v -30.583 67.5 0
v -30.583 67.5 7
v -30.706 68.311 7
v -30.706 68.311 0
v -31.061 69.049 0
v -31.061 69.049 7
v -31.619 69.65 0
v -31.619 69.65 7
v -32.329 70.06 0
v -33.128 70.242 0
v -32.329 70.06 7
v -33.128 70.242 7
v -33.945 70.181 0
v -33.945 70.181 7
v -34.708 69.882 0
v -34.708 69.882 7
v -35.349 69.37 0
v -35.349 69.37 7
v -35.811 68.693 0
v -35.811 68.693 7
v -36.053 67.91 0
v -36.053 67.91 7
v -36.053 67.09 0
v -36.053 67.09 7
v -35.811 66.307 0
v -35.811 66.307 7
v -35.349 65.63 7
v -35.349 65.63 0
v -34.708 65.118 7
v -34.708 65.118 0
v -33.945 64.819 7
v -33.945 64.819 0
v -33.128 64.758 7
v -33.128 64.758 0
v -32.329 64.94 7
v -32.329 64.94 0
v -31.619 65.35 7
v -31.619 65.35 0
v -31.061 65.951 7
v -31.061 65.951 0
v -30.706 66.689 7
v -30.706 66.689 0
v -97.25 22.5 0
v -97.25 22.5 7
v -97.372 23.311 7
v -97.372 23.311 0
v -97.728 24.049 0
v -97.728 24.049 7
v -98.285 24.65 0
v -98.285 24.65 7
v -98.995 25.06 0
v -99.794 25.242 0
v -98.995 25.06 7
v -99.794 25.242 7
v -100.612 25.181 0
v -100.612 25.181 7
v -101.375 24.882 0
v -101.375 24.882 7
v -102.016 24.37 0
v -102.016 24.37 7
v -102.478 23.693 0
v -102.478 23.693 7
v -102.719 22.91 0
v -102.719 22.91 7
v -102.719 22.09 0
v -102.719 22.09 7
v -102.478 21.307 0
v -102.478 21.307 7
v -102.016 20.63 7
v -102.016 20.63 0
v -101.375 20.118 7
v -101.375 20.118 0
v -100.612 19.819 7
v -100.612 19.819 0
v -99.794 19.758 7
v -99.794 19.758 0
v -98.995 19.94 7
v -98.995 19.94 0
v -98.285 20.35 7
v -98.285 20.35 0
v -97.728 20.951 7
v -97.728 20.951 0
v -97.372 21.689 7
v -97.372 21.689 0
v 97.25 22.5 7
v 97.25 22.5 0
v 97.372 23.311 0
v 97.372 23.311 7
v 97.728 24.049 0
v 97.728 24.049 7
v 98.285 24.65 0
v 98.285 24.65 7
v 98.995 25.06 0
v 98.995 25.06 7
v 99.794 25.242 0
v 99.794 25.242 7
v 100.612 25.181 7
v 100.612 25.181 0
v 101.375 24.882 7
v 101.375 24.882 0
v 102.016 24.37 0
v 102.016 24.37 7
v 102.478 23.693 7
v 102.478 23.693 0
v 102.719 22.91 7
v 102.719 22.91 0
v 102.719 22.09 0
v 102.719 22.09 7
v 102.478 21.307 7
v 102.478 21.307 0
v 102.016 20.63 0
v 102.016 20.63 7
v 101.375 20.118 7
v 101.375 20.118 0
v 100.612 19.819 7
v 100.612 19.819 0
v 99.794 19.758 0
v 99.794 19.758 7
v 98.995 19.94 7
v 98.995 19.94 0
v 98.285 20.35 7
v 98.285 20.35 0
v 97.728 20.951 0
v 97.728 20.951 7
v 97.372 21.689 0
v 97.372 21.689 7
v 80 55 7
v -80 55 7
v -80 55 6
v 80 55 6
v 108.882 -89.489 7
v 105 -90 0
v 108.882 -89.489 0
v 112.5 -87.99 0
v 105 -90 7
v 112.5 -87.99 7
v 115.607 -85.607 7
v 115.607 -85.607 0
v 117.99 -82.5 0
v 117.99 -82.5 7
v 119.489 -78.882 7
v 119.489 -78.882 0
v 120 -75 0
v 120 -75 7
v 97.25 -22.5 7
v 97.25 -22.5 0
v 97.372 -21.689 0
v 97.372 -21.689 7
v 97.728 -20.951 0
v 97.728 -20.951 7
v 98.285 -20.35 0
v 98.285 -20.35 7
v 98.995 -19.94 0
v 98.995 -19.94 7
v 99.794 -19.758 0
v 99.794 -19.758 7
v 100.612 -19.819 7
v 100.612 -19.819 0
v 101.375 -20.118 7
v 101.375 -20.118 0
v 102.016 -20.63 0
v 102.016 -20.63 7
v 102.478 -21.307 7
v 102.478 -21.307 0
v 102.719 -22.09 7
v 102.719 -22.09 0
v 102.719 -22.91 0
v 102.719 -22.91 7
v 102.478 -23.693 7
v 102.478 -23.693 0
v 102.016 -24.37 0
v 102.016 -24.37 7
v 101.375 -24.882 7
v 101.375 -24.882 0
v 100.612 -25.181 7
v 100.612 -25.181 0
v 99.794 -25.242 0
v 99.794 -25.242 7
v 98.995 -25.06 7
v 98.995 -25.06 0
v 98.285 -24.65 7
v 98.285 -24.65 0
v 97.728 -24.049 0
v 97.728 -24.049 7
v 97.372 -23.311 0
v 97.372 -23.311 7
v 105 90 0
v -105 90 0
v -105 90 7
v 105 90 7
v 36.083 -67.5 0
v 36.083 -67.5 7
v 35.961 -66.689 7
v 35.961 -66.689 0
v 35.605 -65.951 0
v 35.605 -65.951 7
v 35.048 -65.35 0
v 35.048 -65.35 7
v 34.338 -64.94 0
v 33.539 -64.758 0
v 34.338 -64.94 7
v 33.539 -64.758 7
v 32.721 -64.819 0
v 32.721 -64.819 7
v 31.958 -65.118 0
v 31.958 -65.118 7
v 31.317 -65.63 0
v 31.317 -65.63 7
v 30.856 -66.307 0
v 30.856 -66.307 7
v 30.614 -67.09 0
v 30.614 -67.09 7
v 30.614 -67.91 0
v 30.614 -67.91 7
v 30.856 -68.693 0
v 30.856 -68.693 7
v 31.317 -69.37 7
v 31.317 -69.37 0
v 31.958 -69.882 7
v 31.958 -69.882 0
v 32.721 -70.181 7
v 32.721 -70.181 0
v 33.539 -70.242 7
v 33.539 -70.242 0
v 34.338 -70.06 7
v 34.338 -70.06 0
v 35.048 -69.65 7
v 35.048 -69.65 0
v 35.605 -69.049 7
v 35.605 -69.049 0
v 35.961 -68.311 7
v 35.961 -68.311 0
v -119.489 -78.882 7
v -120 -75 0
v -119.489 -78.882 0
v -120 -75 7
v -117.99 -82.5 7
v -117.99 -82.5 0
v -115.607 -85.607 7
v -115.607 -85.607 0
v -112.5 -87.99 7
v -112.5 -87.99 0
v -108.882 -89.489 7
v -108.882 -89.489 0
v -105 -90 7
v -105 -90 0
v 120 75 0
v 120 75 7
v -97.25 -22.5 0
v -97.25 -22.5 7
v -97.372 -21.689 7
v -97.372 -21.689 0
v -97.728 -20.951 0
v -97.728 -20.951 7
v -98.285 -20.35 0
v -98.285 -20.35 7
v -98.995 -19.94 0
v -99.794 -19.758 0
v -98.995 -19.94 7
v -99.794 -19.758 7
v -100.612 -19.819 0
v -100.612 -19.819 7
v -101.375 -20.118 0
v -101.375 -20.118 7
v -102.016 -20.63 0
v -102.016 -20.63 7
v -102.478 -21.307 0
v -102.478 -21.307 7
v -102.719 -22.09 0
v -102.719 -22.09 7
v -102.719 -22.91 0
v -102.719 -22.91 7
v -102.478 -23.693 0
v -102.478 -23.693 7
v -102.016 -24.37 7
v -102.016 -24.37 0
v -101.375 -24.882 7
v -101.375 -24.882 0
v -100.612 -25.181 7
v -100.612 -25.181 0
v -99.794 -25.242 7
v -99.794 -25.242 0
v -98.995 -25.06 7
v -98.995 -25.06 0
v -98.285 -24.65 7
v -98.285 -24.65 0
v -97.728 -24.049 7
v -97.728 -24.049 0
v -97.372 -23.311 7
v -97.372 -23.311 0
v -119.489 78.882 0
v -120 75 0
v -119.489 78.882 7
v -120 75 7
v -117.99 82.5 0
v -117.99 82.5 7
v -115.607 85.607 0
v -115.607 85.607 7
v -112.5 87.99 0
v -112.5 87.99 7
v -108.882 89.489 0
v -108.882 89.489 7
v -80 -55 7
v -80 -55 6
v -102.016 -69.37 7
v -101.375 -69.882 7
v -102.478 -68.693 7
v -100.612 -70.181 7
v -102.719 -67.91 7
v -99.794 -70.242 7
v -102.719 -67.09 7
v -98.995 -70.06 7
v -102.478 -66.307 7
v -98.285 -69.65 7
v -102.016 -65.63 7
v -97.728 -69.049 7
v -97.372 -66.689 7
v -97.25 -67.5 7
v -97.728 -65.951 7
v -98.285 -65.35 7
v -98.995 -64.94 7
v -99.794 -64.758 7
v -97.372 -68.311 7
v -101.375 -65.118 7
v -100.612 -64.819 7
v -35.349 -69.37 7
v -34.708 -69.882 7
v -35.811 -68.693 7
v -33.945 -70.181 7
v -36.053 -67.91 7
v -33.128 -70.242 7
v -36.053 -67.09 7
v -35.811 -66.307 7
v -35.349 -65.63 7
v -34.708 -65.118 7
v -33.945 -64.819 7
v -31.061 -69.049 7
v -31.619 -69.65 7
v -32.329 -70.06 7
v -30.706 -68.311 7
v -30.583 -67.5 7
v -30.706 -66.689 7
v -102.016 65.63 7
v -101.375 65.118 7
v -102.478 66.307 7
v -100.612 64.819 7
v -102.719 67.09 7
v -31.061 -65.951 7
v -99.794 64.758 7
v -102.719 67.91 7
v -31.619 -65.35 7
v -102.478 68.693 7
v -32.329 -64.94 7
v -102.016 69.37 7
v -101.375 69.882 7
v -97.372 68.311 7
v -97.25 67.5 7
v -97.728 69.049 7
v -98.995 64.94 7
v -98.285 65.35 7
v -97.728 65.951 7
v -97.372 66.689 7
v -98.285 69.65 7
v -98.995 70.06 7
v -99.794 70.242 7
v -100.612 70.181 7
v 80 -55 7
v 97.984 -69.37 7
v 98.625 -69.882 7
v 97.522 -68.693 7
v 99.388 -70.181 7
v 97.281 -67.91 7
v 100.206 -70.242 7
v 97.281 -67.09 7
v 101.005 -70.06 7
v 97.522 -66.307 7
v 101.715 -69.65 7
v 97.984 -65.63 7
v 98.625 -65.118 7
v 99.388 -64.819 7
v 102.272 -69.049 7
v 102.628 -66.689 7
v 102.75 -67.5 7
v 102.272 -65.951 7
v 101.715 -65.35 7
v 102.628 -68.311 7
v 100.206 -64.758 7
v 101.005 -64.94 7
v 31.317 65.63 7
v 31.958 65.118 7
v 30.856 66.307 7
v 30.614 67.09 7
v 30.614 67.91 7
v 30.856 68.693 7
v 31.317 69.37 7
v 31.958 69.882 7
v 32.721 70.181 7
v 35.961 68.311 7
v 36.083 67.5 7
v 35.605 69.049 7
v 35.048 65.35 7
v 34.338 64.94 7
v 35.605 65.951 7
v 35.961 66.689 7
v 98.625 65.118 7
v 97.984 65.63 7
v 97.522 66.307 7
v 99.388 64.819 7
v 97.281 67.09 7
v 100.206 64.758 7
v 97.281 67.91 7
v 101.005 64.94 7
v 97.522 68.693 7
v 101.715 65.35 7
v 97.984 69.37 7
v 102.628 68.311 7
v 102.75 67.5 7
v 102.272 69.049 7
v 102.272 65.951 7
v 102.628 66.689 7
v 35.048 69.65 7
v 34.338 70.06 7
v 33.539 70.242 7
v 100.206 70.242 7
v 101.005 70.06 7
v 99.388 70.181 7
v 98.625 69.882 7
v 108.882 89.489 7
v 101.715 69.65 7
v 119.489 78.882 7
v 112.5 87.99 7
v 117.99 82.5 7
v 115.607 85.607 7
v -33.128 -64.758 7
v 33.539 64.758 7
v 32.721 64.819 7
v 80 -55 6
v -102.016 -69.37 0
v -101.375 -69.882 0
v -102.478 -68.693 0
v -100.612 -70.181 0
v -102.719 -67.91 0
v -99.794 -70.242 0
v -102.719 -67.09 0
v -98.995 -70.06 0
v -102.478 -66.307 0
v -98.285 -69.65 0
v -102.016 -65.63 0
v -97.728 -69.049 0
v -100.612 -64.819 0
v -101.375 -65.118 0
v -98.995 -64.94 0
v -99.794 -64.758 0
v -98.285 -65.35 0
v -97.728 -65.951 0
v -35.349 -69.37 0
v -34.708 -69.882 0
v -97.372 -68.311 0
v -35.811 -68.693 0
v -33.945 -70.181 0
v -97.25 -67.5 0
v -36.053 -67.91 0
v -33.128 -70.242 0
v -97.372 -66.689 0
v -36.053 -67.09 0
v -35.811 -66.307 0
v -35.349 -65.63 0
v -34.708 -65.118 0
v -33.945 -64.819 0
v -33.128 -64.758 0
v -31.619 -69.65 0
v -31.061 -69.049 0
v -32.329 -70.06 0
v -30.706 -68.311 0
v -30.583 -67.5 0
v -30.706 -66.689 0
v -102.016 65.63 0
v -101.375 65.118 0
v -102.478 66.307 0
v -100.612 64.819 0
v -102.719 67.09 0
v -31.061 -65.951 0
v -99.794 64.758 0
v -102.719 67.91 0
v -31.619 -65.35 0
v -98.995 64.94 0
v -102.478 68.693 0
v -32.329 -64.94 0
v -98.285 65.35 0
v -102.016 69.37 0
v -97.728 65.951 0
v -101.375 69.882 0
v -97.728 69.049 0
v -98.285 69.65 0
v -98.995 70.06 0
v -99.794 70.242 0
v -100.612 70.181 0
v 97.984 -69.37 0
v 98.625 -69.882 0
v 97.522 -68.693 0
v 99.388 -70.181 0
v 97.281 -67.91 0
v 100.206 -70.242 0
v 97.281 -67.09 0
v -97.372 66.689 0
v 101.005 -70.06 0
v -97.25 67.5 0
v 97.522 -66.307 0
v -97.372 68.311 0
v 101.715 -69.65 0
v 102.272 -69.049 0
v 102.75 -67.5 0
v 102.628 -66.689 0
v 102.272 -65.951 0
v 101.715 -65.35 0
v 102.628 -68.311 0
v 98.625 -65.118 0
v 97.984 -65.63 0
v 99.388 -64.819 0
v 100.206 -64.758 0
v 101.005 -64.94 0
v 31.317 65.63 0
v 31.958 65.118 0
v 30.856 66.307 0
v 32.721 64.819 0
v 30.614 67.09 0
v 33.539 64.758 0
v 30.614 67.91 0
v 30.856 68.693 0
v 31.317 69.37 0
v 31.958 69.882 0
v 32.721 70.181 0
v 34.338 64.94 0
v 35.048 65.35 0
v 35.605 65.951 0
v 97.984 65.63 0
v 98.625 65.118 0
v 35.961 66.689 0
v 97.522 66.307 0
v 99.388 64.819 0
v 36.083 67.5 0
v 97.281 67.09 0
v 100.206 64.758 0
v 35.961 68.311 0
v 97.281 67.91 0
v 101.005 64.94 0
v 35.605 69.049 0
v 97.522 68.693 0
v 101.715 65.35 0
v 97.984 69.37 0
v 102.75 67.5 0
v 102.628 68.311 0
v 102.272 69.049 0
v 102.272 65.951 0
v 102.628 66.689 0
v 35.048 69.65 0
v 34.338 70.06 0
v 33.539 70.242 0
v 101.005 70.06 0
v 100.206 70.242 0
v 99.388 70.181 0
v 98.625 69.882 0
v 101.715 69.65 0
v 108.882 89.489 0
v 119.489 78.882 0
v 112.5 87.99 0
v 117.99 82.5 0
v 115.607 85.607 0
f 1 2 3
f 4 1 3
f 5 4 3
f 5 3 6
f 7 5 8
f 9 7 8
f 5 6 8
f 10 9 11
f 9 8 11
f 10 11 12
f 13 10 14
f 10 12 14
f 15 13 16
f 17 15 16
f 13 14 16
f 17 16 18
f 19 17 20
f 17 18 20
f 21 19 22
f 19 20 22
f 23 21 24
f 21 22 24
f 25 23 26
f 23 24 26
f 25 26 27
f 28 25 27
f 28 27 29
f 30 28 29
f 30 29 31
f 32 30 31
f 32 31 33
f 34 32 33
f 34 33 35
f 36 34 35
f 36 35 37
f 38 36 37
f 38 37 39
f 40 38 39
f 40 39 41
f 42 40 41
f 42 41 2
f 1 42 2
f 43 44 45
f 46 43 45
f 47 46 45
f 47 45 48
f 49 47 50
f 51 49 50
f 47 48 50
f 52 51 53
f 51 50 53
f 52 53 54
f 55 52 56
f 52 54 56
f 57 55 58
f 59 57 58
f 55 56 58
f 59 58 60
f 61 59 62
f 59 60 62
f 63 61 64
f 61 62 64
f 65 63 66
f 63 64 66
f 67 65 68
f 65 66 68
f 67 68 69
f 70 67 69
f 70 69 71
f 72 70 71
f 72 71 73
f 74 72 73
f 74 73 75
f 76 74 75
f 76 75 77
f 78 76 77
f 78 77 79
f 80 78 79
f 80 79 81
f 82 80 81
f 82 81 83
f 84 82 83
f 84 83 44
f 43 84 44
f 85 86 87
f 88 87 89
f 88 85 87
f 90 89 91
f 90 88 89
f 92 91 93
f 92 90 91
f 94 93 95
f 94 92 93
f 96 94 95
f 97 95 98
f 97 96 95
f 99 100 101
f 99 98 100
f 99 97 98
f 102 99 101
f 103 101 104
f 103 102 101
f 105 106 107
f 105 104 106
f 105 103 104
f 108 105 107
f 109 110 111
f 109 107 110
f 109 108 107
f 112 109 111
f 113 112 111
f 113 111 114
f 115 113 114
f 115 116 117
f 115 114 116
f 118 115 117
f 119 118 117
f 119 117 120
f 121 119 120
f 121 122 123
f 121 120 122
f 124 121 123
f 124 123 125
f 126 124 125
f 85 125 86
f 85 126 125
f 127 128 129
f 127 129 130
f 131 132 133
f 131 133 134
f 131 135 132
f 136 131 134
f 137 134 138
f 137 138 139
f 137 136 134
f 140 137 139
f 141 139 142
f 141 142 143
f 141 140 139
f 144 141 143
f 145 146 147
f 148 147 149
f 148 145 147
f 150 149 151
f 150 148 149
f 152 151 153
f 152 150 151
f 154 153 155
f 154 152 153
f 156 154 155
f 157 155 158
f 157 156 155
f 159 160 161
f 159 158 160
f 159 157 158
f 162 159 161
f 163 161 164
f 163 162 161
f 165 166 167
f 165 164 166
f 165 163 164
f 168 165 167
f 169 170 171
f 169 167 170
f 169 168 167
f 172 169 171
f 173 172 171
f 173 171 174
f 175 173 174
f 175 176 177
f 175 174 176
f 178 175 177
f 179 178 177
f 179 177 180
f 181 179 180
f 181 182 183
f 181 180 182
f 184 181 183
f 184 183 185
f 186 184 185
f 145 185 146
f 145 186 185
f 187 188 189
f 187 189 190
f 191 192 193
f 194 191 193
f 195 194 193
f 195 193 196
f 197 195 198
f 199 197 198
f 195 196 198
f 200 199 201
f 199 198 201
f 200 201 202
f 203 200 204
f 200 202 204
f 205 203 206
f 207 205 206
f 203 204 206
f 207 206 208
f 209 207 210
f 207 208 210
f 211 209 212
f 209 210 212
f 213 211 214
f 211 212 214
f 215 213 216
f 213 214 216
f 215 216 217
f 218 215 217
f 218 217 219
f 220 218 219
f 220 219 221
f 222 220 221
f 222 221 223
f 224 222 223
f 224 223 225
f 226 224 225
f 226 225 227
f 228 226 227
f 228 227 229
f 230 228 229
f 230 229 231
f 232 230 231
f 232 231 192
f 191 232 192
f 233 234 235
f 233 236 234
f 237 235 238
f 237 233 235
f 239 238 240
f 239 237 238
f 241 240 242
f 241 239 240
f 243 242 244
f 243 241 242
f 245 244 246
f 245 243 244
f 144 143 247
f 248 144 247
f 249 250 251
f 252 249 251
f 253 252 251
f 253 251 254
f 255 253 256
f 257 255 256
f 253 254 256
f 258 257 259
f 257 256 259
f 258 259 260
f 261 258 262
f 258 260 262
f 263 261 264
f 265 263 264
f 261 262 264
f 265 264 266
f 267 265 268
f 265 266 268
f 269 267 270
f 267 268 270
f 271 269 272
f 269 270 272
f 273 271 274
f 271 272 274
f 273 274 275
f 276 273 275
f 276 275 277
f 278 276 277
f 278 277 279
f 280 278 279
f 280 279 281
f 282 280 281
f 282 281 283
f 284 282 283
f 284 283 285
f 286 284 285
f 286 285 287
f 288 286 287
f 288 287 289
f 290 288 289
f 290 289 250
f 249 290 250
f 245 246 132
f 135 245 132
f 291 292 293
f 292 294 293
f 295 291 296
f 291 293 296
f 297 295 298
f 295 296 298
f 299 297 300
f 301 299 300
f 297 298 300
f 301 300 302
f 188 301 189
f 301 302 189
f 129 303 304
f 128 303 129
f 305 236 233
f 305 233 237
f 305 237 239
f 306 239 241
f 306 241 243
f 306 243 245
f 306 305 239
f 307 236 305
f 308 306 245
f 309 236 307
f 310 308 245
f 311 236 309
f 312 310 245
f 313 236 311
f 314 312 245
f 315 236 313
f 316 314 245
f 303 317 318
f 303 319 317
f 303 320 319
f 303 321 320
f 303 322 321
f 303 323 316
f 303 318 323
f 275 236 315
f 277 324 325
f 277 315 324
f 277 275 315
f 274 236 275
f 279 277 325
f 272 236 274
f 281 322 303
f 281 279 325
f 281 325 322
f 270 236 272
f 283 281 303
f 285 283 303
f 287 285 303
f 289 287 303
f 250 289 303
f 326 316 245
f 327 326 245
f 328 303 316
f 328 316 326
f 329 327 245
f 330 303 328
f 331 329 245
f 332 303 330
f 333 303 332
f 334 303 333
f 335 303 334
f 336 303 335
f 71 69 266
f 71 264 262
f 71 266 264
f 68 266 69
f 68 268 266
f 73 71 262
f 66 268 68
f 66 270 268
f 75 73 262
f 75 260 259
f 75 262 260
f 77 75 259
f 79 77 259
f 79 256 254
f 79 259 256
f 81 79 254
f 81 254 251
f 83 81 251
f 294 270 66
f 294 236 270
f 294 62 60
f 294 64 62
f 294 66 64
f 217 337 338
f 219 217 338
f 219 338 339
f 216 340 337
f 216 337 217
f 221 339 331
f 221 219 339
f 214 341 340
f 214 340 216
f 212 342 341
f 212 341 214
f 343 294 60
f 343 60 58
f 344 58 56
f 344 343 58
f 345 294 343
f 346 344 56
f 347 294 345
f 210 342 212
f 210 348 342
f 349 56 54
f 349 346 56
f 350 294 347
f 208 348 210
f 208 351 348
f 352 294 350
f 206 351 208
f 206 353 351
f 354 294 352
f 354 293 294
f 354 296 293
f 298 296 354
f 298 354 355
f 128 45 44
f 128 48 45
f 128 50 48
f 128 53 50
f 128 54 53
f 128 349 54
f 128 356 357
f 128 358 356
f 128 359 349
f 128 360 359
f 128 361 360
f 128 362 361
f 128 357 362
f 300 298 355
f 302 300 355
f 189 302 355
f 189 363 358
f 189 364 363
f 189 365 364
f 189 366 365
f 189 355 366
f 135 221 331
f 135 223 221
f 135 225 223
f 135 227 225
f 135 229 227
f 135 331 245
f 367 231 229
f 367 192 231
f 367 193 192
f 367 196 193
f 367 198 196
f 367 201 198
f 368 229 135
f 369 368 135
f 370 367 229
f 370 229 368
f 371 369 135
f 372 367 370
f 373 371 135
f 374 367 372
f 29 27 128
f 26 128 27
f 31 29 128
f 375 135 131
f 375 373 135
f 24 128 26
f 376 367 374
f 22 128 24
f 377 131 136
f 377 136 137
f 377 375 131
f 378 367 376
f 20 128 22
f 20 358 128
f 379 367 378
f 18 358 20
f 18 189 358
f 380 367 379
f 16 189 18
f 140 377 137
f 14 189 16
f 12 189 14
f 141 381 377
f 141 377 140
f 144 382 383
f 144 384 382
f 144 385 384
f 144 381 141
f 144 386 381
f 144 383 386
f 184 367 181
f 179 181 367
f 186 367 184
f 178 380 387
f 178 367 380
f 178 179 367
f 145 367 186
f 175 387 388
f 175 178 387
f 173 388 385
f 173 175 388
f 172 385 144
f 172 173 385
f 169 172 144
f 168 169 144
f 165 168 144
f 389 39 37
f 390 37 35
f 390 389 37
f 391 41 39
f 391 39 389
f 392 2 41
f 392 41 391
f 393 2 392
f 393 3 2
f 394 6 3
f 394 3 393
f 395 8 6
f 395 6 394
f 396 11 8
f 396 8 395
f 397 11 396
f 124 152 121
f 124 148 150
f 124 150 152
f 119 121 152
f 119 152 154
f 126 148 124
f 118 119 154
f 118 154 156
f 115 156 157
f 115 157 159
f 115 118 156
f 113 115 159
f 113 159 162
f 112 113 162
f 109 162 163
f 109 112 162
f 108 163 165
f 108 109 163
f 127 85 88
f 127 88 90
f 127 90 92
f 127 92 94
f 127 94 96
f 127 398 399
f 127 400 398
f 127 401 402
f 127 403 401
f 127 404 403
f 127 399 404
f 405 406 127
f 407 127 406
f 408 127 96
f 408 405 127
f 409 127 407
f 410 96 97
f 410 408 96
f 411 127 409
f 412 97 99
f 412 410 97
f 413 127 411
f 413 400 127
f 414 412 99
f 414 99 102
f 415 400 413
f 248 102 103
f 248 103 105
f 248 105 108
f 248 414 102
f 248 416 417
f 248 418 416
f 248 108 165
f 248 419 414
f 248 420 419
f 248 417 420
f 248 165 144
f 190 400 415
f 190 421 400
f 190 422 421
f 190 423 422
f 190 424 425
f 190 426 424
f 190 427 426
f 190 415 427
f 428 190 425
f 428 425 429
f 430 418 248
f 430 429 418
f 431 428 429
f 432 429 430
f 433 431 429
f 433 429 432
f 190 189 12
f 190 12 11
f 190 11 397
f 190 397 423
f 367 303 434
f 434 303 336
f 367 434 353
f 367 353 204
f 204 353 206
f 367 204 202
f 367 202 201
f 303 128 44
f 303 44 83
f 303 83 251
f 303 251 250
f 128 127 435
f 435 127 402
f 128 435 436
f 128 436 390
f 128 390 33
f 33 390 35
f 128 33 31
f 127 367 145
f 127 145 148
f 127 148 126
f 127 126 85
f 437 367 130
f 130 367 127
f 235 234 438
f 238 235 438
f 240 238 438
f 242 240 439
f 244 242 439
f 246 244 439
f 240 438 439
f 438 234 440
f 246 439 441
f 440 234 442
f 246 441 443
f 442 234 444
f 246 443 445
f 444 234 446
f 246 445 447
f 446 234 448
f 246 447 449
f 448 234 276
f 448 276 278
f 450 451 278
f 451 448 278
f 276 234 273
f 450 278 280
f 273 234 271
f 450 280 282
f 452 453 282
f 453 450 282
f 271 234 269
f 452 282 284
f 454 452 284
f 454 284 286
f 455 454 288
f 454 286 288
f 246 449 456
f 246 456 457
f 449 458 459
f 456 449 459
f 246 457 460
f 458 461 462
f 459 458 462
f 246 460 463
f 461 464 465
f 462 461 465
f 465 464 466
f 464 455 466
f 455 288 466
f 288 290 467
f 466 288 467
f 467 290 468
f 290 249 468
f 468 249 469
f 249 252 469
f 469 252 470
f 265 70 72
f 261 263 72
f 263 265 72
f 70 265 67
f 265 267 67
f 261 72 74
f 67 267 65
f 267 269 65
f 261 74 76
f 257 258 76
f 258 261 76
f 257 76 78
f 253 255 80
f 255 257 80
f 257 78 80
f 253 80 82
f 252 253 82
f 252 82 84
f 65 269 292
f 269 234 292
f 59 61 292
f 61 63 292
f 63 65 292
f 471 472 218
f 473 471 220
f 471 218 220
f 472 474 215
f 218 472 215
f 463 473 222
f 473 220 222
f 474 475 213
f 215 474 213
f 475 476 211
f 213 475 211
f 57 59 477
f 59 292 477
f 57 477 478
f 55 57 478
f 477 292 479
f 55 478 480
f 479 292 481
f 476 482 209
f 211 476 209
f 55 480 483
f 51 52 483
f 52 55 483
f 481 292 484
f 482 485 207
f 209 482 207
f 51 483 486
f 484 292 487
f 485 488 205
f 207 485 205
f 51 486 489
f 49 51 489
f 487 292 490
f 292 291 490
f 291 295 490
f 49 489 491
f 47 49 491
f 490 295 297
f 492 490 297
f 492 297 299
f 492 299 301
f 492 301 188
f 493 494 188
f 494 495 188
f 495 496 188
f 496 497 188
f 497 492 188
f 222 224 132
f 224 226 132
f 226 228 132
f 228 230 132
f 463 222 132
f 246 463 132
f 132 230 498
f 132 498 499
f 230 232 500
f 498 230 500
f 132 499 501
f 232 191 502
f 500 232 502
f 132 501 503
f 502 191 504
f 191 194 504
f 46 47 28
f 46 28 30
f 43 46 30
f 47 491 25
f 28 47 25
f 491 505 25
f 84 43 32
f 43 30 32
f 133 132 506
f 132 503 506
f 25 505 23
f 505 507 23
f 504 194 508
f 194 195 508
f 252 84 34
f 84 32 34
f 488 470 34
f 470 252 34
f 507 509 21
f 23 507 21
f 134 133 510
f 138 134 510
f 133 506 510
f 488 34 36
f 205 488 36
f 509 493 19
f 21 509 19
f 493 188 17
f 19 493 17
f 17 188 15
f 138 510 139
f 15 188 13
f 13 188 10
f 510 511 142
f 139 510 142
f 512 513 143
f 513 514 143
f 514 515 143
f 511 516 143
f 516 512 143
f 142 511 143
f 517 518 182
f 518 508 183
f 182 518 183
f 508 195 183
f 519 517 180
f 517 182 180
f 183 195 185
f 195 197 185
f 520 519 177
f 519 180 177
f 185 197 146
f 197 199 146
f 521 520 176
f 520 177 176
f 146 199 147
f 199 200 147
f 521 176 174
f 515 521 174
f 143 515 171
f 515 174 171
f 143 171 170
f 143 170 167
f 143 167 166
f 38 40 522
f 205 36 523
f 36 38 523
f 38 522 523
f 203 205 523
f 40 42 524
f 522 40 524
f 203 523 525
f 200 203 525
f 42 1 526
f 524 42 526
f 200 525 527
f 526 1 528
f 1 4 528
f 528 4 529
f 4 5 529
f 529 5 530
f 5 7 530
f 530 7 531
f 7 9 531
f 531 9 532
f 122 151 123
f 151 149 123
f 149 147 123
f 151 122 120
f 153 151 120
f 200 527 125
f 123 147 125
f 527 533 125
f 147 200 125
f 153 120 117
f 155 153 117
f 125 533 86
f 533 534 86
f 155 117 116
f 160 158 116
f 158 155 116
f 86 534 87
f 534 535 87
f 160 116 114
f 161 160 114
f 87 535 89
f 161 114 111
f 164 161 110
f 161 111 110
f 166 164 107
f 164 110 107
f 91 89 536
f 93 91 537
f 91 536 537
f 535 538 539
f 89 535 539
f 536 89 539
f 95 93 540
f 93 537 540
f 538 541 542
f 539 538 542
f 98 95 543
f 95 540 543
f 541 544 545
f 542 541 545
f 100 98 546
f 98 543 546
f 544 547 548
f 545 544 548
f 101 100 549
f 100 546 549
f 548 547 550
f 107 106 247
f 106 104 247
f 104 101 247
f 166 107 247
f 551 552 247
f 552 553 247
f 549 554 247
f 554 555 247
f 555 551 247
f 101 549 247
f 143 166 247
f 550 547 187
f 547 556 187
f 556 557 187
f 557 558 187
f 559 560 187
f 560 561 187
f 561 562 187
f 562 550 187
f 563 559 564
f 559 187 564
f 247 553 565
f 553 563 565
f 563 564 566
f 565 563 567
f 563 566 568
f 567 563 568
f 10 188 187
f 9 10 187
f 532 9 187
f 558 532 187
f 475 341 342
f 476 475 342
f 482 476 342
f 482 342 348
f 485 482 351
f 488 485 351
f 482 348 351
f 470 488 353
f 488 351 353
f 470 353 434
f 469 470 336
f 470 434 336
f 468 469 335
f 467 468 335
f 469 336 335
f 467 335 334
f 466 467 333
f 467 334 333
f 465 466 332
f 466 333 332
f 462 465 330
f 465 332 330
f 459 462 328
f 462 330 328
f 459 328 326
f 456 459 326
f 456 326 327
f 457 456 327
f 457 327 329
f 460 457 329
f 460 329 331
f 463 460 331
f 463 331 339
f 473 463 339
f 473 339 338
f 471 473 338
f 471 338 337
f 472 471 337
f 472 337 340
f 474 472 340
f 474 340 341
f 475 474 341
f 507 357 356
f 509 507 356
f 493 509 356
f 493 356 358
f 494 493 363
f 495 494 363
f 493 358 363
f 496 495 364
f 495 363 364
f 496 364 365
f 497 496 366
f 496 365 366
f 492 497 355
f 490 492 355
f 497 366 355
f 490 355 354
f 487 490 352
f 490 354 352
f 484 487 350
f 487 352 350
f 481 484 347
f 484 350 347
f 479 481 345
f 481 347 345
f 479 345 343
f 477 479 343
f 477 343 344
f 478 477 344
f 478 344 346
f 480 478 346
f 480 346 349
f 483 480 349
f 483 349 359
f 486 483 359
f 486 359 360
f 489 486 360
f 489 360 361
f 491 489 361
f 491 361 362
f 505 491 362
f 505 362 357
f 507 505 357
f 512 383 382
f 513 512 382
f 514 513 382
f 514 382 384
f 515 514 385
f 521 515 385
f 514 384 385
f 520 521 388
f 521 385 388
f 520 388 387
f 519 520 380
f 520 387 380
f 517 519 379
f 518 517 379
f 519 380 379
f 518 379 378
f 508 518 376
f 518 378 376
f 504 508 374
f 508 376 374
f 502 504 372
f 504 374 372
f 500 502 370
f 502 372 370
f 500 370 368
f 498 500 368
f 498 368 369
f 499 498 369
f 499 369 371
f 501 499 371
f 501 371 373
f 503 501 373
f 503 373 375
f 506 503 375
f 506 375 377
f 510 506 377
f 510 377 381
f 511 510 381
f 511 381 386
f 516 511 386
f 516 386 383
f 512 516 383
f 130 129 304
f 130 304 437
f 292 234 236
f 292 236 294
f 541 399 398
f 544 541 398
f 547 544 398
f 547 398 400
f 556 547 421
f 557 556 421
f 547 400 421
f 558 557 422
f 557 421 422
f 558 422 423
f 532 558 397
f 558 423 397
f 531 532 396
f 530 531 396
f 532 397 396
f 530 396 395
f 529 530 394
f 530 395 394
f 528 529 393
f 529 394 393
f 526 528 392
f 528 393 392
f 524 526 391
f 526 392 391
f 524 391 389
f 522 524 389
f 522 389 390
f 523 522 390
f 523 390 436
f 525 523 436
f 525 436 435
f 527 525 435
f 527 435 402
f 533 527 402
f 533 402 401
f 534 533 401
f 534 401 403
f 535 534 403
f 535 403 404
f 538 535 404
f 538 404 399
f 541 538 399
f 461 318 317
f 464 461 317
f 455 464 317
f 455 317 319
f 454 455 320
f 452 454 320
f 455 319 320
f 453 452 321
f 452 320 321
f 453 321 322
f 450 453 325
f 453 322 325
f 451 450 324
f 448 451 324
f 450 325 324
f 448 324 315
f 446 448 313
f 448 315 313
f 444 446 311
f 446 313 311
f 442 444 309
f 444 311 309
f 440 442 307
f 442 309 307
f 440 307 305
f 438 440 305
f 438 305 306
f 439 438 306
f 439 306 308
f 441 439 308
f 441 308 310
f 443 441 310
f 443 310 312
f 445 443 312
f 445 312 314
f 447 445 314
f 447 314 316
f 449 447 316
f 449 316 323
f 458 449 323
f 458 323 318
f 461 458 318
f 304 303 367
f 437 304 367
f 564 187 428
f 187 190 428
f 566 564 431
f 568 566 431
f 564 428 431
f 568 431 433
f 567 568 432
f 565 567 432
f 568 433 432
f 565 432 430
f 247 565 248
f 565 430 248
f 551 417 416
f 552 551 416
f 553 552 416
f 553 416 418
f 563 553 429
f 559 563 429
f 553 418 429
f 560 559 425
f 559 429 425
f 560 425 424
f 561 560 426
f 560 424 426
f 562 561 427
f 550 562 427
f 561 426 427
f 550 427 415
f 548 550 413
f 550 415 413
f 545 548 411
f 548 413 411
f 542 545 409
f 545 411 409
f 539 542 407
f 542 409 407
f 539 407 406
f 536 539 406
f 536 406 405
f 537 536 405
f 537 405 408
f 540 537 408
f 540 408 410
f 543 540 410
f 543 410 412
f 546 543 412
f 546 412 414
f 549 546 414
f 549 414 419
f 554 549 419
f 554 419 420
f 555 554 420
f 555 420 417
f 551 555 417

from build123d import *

# Parameters (mm, degrees)
SKETCH003_W         = 240
SKETCH003_H         = 180
PAD002_DEPTH        = 7
SKETCH004_R         = 2.75
POCKET_DEPTH        = 7.001
LINEARPATTERN_COUNT = 4
LINEARPATTERN_PITCH = 66.666667
SKETCH041_R         = 2.75
POCKET001_DEPTH     = 607.164311
SKETCH_W            = 160
SKETCH_H            = 110
POCKET002_DEPTH     = 1
FILLET_R            = 15


with BuildPart() as part:
    # Sketch003 → Pad002 (new body)
    with BuildSketch(Plane.XY):
        Rectangle(SKETCH003_W, SKETCH003_H)
    extrude(amount=PAD002_DEPTH)

    # Sketch004 (on Face6 of Pad002) → Pocket (cut, through all)
    with BuildSketch(Plane.XY.offset(7)):
        with Locations((-100, 67.5)):
            Circle(SKETCH004_R)
        with Locations((-100, -67.5)):
            Circle(SKETCH004_R)
    pocket = extrude(amount=-POCKET_DEPTH, mode=Mode.SUBTRACT)

    # LinearPattern: Pocket ×4
    with Locations(*[(i * LINEARPATTERN_PITCH, 0, 0) for i in range(1, LINEARPATTERN_COUNT)]):
        add(pocket, mode=Mode.SUBTRACT)

    # Sketch041 (on Face5 of LinearPattern) → Pocket001 (cut, through all)
    with BuildSketch(Plane.XY.offset(7)):
        with Locations((-100, 22.5)):
            Circle(SKETCH041_R)
        with Locations((-100, -22.5)):
            Circle(SKETCH041_R)
    pocket001 = extrude(amount=-POCKET001_DEPTH, mode=Mode.SUBTRACT)

    # Mirrored: Pocket001 across YZ
    add(pocket001.mirror(Plane.YZ), mode=Mode.SUBTRACT)

    # Sketch (on Face5 of Mirrored) → Pocket002 (cut)
    with BuildSketch(Plane.XY.offset(7)):
        Rectangle(SKETCH_W, SKETCH_H)
    extrude(amount=-POCKET002_DEPTH, mode=Mode.SUBTRACT)

    # Fillet
    fillet_edges = [part.edges().sort_by_distance(p)[0] for p in [
        (-120, -90, 3.5),
        (-120, 90, 3.5),
        (120, 90, 3.5),
        (120, -90, 3.5),
    ]]
    fillet(fillet_edges, radius=FILLET_R)


solid = part.part
